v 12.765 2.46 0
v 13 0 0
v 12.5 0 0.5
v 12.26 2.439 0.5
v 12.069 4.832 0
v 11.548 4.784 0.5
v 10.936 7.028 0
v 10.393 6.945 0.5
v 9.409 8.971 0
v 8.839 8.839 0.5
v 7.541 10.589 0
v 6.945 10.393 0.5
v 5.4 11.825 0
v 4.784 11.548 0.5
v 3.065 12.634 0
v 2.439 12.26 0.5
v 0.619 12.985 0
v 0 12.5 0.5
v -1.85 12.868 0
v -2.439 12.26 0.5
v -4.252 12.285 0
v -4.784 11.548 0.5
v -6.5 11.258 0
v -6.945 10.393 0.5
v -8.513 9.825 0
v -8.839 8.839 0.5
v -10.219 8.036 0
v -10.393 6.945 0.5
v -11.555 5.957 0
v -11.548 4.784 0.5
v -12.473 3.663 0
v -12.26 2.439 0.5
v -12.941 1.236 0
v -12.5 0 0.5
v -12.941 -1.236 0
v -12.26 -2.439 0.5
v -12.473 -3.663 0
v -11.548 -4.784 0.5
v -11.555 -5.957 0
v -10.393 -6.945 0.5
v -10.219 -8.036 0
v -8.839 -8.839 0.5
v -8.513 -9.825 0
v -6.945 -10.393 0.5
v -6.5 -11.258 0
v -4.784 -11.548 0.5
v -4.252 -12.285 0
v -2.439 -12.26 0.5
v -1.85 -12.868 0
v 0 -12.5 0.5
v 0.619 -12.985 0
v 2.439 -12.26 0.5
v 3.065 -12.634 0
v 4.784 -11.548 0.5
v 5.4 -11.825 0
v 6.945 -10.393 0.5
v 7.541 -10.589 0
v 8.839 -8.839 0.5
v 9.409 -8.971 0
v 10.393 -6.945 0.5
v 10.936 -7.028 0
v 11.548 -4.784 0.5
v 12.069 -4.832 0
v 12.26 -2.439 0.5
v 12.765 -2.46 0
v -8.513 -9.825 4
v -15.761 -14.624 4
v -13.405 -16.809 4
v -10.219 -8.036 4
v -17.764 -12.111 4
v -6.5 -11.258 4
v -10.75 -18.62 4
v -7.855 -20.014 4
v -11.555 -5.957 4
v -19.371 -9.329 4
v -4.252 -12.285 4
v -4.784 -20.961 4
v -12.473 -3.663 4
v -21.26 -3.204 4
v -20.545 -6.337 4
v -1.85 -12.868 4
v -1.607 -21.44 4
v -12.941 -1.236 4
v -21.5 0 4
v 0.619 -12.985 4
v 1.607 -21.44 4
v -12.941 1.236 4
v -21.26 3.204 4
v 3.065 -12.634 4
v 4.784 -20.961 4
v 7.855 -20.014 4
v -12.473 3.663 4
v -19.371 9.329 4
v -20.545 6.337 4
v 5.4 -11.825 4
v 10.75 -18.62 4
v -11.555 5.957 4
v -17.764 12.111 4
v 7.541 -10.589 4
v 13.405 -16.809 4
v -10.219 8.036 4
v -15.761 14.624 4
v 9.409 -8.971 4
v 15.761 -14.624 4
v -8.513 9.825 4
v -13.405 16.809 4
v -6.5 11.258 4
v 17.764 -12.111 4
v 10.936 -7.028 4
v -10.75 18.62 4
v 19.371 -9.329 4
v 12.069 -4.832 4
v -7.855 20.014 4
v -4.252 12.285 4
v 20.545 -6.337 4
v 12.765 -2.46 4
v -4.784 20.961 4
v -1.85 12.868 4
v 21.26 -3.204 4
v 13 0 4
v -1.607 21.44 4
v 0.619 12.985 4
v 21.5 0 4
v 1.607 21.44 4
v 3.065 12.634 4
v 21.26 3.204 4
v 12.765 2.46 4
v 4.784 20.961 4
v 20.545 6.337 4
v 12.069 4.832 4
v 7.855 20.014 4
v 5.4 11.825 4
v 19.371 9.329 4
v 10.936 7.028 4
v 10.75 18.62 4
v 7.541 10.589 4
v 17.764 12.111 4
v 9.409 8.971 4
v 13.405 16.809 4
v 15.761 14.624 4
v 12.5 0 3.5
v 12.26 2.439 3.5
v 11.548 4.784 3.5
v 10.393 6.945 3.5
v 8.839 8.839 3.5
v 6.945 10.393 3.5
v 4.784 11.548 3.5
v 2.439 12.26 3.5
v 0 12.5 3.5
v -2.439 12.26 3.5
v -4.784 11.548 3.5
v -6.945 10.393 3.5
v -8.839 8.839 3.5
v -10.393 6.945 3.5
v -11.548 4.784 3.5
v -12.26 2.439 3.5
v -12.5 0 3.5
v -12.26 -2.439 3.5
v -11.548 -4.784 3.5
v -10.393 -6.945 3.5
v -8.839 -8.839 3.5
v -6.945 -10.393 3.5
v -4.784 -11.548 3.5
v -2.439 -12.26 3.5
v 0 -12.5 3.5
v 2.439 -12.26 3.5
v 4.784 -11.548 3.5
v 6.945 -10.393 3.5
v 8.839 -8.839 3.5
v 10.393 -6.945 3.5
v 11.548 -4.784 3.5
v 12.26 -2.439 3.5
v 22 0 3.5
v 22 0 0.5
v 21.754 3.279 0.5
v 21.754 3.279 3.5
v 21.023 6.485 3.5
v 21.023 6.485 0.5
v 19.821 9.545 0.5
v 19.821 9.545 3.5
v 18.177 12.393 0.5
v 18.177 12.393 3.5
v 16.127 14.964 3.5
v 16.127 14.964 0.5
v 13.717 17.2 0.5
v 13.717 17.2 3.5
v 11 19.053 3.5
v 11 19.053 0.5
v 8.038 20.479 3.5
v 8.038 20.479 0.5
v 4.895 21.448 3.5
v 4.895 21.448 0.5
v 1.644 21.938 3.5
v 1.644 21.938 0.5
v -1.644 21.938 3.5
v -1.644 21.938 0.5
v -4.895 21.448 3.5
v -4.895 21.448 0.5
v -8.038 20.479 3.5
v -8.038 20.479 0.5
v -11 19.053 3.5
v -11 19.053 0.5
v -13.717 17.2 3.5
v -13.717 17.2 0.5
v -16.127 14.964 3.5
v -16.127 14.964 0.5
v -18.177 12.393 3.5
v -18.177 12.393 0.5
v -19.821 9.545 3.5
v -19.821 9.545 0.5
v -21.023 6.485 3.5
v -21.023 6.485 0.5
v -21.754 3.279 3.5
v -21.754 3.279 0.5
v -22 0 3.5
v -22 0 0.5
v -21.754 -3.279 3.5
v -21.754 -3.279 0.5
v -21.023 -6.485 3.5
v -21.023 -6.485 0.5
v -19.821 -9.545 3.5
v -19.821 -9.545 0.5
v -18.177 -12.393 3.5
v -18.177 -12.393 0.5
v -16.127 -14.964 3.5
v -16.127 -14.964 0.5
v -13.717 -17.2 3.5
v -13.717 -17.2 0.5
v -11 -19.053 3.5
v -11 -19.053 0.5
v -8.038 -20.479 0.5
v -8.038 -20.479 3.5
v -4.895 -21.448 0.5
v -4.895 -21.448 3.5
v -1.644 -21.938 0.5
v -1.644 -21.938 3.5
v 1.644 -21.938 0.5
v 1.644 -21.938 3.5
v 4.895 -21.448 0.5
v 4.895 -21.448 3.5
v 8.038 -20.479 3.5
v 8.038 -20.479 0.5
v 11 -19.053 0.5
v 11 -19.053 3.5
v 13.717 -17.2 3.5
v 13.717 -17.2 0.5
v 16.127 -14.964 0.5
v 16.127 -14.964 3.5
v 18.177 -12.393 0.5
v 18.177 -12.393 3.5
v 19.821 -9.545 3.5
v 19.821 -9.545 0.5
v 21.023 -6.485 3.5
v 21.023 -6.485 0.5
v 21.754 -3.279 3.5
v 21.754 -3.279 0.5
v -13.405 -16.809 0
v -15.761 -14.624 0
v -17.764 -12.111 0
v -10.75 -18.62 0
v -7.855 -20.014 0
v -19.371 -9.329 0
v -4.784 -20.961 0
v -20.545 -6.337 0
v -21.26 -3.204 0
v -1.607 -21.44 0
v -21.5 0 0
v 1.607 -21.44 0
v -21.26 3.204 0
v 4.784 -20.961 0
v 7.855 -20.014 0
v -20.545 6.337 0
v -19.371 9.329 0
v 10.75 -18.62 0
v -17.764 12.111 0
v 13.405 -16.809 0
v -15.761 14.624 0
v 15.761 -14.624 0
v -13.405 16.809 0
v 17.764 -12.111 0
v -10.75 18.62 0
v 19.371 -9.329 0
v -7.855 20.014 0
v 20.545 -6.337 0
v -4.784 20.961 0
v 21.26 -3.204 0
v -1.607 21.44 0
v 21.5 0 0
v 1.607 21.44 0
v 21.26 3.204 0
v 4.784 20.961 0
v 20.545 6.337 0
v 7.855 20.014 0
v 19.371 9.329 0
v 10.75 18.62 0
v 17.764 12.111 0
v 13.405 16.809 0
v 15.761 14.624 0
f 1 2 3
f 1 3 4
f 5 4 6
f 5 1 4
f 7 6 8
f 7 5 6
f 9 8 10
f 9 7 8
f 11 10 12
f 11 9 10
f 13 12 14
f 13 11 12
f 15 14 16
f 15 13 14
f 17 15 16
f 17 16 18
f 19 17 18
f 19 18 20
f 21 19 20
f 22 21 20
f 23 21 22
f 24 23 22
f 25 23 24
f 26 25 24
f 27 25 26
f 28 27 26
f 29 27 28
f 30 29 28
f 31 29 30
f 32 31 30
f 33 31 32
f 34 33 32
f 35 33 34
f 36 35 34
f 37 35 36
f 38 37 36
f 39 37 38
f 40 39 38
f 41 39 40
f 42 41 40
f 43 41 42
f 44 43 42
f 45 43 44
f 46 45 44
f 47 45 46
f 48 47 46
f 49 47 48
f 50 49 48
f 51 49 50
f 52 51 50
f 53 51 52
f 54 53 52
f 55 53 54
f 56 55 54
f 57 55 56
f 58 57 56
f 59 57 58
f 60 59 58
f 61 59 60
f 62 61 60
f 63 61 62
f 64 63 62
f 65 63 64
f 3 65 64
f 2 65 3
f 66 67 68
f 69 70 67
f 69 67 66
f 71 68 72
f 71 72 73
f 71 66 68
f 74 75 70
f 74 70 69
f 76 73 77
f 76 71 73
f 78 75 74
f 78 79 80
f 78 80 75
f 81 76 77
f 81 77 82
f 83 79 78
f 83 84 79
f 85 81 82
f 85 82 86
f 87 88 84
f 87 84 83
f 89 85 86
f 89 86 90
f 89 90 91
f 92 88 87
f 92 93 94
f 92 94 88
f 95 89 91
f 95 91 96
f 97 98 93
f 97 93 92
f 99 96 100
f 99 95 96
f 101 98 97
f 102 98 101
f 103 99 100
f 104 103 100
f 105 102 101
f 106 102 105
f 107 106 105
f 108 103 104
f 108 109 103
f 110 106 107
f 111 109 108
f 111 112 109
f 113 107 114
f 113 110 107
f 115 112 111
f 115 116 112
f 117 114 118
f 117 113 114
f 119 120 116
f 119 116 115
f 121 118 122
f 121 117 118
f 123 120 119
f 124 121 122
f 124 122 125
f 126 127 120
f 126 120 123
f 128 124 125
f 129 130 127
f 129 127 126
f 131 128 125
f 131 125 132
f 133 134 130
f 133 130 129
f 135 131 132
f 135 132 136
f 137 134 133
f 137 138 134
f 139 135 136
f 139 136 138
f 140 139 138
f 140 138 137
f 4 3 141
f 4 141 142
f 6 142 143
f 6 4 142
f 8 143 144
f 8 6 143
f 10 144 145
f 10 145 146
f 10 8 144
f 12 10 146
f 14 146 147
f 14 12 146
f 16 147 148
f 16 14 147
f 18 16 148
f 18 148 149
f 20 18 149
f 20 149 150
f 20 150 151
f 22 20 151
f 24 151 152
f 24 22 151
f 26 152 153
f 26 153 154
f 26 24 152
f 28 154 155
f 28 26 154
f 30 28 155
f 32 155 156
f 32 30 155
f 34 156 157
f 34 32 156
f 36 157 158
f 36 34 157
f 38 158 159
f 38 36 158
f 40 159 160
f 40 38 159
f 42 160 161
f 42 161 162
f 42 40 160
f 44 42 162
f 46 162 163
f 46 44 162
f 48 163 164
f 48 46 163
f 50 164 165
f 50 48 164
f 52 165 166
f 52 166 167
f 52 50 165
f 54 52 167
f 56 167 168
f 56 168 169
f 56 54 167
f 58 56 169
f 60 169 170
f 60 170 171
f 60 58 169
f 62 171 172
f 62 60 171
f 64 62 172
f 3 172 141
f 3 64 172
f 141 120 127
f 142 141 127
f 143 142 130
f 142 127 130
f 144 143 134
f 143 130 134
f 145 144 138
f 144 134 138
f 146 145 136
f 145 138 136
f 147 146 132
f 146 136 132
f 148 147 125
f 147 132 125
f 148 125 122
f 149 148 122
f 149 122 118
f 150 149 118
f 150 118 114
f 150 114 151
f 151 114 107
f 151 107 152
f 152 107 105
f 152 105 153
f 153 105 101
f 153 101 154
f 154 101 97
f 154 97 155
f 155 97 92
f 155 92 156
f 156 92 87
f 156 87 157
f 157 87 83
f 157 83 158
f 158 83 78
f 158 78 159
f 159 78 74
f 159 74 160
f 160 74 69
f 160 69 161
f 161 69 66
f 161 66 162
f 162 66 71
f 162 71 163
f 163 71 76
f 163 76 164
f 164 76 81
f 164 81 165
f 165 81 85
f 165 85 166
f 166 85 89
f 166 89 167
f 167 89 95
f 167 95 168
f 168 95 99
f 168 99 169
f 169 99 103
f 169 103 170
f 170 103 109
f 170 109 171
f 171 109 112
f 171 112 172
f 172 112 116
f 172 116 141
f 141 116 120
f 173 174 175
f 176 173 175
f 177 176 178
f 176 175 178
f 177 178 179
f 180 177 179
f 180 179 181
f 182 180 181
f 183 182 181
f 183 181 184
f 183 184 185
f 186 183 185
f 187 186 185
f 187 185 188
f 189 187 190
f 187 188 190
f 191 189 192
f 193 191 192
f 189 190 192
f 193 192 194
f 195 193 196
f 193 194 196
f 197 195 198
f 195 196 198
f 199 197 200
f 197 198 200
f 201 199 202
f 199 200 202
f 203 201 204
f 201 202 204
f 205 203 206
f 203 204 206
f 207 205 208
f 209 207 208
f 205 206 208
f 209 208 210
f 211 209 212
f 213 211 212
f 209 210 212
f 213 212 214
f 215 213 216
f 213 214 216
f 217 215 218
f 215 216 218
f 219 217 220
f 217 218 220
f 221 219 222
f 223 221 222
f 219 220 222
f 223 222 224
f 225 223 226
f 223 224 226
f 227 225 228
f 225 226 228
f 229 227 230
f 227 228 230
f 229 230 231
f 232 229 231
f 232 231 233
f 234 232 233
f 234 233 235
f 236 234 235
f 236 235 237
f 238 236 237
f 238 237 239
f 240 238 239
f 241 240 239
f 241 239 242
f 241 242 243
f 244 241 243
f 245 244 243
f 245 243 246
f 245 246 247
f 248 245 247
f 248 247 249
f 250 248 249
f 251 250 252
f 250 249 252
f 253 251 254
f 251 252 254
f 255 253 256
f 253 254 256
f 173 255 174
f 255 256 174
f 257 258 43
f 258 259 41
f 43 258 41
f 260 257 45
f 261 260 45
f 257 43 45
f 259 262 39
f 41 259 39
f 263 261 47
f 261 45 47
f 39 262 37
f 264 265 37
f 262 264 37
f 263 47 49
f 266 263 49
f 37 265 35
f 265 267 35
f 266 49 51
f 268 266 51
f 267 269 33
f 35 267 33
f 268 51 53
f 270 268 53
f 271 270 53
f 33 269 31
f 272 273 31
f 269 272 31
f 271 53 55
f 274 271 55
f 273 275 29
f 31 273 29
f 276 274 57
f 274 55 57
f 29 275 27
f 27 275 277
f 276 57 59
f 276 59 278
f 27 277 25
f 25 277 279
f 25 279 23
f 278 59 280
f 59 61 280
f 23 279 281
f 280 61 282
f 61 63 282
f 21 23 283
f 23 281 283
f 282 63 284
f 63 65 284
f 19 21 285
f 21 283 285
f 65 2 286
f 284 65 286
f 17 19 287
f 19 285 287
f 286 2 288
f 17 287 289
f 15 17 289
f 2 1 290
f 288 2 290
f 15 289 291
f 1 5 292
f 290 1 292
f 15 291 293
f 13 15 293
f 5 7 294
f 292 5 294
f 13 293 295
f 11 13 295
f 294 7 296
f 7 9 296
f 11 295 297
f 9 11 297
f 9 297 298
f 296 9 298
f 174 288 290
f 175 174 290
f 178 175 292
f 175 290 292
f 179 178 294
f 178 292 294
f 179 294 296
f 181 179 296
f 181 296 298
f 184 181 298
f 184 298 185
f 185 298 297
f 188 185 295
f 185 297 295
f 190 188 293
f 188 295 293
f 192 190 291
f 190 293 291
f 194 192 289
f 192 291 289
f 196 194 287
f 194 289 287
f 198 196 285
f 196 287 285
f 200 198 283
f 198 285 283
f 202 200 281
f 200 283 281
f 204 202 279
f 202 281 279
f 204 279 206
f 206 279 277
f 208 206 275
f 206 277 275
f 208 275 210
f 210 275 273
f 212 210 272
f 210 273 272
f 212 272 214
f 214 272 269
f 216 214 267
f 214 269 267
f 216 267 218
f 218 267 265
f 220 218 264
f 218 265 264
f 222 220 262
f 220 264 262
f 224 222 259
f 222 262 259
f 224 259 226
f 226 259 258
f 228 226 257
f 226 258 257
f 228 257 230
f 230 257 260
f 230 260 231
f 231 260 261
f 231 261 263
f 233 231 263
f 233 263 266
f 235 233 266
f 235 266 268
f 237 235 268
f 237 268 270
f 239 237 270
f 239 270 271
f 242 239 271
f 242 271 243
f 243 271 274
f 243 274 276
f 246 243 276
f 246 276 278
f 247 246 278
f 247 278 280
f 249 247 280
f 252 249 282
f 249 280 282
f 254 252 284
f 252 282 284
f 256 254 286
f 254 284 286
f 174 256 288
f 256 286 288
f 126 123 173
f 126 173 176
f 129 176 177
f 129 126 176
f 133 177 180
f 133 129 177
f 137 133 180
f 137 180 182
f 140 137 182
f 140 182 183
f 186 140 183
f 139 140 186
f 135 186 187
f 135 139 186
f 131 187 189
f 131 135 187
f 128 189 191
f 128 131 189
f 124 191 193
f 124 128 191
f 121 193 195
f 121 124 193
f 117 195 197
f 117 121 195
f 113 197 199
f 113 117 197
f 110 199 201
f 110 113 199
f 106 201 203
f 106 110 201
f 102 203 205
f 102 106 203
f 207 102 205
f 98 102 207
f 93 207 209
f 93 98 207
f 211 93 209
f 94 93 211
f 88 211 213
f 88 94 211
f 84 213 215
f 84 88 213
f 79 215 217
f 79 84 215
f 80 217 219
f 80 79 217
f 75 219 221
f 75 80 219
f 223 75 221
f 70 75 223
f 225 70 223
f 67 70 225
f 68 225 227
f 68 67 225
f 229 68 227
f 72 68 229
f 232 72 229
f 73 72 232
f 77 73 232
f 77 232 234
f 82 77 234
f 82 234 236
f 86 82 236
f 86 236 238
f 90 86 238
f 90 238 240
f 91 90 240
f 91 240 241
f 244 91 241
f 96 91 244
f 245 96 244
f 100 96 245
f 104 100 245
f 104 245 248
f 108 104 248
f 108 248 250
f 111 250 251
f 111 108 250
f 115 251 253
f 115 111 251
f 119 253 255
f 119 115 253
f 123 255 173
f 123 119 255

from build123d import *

# Parameters (mm, degrees)
SZKIC1_R                    = 22
SZKIC1_R_2                  = 12.5
DODANIE_WYCI_GNI_CIE1_DEPTH = 4
SFAZOWANIE1_SIZE            = 0.5


with BuildPart() as part:
    # Szkic1 → Dodanie-wyciągnięcie1 (new body)
    with BuildSketch(Plane.XY):
        Circle(SZKIC1_R)
        Circle(SZKIC1_R_2, mode=Mode.SUBTRACT)
    extrude(amount=DODANIE_WYCI_GNI_CIE1_DEPTH)

    # Sfazowanie1
    sfazowanie1_edges = [part.edges().sort_by_distance(p)[0] for p in [
        (-22, 0, 0),
        (-22, 0, 4),
        (-12.5, 0, 0),
        (-12.5, 0, 4),
    ]]
    chamfer(sfazowanie1_edges, length=SFAZOWANIE1_SIZE)


solid = part.part
